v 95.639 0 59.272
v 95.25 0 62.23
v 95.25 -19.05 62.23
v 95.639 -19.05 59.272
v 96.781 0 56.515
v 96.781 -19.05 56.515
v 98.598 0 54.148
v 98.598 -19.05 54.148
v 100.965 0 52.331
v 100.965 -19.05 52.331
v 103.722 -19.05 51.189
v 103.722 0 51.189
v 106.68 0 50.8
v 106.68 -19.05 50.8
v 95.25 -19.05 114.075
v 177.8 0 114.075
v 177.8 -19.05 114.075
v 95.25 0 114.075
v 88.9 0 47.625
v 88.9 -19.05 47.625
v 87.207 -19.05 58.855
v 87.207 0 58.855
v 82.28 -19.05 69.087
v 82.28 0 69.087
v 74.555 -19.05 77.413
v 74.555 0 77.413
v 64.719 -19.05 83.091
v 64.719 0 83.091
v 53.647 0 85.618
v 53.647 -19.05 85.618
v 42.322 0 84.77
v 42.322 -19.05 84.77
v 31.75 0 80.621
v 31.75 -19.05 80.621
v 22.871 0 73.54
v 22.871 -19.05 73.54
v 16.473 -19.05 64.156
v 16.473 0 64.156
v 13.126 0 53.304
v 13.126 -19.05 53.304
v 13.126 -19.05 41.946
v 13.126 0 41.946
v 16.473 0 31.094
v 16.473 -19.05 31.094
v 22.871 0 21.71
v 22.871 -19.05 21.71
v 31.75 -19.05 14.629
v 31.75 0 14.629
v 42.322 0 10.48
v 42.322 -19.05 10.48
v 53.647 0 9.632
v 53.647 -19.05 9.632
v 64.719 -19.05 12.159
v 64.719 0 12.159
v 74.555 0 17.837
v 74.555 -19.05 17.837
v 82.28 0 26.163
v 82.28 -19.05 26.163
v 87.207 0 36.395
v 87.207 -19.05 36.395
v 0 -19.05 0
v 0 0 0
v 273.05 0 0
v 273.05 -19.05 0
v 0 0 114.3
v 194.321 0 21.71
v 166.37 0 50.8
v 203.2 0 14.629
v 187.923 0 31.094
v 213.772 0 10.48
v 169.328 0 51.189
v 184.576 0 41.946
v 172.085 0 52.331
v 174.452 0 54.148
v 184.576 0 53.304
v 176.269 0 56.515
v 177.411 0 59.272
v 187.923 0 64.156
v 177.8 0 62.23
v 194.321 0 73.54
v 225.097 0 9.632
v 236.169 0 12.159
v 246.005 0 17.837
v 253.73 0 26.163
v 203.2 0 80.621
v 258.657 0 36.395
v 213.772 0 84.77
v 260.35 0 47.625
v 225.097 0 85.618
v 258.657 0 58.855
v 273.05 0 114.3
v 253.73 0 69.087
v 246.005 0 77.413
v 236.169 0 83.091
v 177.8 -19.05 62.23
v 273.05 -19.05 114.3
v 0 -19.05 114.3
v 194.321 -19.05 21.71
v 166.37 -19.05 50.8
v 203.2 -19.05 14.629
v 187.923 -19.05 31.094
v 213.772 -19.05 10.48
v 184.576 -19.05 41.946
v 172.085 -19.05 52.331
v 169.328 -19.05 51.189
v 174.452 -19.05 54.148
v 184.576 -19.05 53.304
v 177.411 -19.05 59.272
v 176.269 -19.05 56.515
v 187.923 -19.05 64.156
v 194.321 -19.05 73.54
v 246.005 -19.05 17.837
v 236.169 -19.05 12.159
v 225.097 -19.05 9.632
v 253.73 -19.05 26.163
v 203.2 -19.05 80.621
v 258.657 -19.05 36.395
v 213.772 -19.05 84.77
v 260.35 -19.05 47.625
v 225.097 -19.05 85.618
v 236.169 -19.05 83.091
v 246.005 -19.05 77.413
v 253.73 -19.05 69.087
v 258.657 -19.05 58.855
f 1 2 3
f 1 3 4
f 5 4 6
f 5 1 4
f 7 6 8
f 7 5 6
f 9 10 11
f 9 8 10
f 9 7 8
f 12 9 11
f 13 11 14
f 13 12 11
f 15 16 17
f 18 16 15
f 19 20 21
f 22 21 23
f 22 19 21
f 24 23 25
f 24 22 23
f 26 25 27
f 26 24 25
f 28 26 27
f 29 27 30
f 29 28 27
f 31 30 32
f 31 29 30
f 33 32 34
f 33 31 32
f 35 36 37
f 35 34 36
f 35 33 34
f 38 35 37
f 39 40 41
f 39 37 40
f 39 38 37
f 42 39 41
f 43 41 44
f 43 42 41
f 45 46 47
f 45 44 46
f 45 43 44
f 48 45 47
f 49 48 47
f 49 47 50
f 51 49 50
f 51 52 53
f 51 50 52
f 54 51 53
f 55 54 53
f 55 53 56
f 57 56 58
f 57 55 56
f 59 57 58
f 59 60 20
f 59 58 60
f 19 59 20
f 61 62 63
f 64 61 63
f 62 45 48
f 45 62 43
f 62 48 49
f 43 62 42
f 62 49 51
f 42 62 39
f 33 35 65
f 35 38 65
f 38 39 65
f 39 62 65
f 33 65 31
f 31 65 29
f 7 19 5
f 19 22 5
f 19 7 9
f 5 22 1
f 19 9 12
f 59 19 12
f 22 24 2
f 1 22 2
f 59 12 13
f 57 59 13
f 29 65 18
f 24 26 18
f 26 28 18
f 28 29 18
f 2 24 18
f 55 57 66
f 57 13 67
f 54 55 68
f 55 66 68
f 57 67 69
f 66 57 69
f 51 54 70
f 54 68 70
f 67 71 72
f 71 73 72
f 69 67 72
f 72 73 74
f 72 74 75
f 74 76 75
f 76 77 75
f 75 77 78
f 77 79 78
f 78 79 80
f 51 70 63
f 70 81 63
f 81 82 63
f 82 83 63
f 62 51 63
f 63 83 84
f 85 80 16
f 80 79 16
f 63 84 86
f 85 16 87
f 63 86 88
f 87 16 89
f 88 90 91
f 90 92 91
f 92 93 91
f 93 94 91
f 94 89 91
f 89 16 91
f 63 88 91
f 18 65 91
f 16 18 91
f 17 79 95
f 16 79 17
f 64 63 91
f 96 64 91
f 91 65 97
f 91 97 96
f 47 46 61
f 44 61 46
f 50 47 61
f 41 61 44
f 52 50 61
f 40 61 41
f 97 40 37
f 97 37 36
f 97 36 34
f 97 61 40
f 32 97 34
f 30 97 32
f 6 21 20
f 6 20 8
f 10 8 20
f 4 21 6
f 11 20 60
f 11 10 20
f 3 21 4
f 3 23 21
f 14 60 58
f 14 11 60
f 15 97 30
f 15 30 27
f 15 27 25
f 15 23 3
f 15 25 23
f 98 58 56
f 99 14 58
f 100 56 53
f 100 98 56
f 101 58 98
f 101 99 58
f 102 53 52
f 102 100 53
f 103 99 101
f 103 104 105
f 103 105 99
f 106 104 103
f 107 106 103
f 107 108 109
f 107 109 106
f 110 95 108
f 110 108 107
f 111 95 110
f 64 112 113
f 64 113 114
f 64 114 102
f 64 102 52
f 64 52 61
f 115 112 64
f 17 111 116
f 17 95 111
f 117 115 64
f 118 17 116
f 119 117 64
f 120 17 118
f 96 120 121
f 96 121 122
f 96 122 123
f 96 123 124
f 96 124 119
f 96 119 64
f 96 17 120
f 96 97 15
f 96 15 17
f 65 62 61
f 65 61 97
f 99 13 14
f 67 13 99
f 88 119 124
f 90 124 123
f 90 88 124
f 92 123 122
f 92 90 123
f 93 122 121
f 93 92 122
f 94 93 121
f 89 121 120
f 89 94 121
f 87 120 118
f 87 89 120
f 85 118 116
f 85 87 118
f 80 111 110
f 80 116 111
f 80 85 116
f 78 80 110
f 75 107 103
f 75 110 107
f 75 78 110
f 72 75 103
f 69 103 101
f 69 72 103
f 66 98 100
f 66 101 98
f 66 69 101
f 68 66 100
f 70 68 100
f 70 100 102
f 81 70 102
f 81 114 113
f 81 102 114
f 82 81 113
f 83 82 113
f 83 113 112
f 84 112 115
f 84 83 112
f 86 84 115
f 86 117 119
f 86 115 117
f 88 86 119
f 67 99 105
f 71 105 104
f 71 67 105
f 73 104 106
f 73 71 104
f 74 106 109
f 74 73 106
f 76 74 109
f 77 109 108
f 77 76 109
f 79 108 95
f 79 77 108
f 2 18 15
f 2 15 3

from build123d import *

# Parameters (mm, degrees)
F0_W     = 273.05
F0_H     = 114.3
F1_DEPTH = 19.05
F2_R     = 38.1
F3_DEPTH = 25.4
F5_DEPTH = 25.4
F6_DEPTH = 25.4
F7_DEPTH = 25.4


with BuildPart() as f1:
    # F0 (on Front) → F1 (new body)
    with BuildSketch(Plane.XZ):
        with Locations((136.525, 57.15)):
            Rectangle(F0_W, F0_H)
    extrude(amount=F1_DEPTH)

    # F2 (on Front) → F3 (cut)
    with BuildSketch(Plane.XZ):
        with Locations((50.8, 47.625)):
            Circle(F2_R)
        with Locations((222.25, 47.625)):
            Circle(F2_R)
    extrude(amount=F3_DEPTH, mode=Mode.SUBTRACT)

    # F4 (on Front) → F5 (cut)
    with BuildSketch(Plane.XZ):
        with BuildLine():
            Line((177.8, 114.074679), (95.25, 114.074679))
            Line((95.25, 114.074679), (95.25, 62.23))
            ThreePointArc((95.25, 62.23), (98.597769, 54.147769), (106.68, 50.8))
            Line((106.68, 50.8), (166.37, 50.8))
            ThreePointArc((166.37, 50.8), (174.452231, 54.147769), (177.8, 62.23))
            Line((177.8, 62.23), (177.8, 114.074679))
        make_face()
    extrude(amount=-F5_DEPTH, mode=Mode.SUBTRACT)

    # F4 (on Front) → F6 (cut)
    with BuildSketch(Plane.XZ):
        with BuildLine():
            Line((177.8, 114.074679), (95.25, 114.074679))
            Line((95.25, 114.074679), (95.25, 62.23))
            ThreePointArc((95.25, 62.23), (98.597769, 54.147769), (106.68, 50.8))
            Line((106.68, 50.8), (166.37, 50.8))
            ThreePointArc((166.37, 50.8), (174.452231, 54.147769), (177.8, 62.23))
            Line((177.8, 62.23), (177.8, 114.074679))
        make_face()
    extrude(amount=F6_DEPTH, mode=Mode.SUBTRACT)

    # F4 (on Front) → F7 (cut)
    with BuildSketch(Plane.XZ):
        with BuildLine():
            Line((177.8, 114.074679), (95.25, 114.074679))
            Line((95.25, 114.074679), (95.25, 62.23))
            ThreePointArc((95.25, 62.23), (98.597769, 54.147769), (106.68, 50.8))
            Line((106.68, 50.8), (166.37, 50.8))
            ThreePointArc((166.37, 50.8), (174.452231, 54.147769), (177.8, 62.23))
            Line((177.8, 62.23), (177.8, 114.074679))
        make_face()
    extrude(amount=-F7_DEPTH, mode=Mode.SUBTRACT)


solid = f1.part
